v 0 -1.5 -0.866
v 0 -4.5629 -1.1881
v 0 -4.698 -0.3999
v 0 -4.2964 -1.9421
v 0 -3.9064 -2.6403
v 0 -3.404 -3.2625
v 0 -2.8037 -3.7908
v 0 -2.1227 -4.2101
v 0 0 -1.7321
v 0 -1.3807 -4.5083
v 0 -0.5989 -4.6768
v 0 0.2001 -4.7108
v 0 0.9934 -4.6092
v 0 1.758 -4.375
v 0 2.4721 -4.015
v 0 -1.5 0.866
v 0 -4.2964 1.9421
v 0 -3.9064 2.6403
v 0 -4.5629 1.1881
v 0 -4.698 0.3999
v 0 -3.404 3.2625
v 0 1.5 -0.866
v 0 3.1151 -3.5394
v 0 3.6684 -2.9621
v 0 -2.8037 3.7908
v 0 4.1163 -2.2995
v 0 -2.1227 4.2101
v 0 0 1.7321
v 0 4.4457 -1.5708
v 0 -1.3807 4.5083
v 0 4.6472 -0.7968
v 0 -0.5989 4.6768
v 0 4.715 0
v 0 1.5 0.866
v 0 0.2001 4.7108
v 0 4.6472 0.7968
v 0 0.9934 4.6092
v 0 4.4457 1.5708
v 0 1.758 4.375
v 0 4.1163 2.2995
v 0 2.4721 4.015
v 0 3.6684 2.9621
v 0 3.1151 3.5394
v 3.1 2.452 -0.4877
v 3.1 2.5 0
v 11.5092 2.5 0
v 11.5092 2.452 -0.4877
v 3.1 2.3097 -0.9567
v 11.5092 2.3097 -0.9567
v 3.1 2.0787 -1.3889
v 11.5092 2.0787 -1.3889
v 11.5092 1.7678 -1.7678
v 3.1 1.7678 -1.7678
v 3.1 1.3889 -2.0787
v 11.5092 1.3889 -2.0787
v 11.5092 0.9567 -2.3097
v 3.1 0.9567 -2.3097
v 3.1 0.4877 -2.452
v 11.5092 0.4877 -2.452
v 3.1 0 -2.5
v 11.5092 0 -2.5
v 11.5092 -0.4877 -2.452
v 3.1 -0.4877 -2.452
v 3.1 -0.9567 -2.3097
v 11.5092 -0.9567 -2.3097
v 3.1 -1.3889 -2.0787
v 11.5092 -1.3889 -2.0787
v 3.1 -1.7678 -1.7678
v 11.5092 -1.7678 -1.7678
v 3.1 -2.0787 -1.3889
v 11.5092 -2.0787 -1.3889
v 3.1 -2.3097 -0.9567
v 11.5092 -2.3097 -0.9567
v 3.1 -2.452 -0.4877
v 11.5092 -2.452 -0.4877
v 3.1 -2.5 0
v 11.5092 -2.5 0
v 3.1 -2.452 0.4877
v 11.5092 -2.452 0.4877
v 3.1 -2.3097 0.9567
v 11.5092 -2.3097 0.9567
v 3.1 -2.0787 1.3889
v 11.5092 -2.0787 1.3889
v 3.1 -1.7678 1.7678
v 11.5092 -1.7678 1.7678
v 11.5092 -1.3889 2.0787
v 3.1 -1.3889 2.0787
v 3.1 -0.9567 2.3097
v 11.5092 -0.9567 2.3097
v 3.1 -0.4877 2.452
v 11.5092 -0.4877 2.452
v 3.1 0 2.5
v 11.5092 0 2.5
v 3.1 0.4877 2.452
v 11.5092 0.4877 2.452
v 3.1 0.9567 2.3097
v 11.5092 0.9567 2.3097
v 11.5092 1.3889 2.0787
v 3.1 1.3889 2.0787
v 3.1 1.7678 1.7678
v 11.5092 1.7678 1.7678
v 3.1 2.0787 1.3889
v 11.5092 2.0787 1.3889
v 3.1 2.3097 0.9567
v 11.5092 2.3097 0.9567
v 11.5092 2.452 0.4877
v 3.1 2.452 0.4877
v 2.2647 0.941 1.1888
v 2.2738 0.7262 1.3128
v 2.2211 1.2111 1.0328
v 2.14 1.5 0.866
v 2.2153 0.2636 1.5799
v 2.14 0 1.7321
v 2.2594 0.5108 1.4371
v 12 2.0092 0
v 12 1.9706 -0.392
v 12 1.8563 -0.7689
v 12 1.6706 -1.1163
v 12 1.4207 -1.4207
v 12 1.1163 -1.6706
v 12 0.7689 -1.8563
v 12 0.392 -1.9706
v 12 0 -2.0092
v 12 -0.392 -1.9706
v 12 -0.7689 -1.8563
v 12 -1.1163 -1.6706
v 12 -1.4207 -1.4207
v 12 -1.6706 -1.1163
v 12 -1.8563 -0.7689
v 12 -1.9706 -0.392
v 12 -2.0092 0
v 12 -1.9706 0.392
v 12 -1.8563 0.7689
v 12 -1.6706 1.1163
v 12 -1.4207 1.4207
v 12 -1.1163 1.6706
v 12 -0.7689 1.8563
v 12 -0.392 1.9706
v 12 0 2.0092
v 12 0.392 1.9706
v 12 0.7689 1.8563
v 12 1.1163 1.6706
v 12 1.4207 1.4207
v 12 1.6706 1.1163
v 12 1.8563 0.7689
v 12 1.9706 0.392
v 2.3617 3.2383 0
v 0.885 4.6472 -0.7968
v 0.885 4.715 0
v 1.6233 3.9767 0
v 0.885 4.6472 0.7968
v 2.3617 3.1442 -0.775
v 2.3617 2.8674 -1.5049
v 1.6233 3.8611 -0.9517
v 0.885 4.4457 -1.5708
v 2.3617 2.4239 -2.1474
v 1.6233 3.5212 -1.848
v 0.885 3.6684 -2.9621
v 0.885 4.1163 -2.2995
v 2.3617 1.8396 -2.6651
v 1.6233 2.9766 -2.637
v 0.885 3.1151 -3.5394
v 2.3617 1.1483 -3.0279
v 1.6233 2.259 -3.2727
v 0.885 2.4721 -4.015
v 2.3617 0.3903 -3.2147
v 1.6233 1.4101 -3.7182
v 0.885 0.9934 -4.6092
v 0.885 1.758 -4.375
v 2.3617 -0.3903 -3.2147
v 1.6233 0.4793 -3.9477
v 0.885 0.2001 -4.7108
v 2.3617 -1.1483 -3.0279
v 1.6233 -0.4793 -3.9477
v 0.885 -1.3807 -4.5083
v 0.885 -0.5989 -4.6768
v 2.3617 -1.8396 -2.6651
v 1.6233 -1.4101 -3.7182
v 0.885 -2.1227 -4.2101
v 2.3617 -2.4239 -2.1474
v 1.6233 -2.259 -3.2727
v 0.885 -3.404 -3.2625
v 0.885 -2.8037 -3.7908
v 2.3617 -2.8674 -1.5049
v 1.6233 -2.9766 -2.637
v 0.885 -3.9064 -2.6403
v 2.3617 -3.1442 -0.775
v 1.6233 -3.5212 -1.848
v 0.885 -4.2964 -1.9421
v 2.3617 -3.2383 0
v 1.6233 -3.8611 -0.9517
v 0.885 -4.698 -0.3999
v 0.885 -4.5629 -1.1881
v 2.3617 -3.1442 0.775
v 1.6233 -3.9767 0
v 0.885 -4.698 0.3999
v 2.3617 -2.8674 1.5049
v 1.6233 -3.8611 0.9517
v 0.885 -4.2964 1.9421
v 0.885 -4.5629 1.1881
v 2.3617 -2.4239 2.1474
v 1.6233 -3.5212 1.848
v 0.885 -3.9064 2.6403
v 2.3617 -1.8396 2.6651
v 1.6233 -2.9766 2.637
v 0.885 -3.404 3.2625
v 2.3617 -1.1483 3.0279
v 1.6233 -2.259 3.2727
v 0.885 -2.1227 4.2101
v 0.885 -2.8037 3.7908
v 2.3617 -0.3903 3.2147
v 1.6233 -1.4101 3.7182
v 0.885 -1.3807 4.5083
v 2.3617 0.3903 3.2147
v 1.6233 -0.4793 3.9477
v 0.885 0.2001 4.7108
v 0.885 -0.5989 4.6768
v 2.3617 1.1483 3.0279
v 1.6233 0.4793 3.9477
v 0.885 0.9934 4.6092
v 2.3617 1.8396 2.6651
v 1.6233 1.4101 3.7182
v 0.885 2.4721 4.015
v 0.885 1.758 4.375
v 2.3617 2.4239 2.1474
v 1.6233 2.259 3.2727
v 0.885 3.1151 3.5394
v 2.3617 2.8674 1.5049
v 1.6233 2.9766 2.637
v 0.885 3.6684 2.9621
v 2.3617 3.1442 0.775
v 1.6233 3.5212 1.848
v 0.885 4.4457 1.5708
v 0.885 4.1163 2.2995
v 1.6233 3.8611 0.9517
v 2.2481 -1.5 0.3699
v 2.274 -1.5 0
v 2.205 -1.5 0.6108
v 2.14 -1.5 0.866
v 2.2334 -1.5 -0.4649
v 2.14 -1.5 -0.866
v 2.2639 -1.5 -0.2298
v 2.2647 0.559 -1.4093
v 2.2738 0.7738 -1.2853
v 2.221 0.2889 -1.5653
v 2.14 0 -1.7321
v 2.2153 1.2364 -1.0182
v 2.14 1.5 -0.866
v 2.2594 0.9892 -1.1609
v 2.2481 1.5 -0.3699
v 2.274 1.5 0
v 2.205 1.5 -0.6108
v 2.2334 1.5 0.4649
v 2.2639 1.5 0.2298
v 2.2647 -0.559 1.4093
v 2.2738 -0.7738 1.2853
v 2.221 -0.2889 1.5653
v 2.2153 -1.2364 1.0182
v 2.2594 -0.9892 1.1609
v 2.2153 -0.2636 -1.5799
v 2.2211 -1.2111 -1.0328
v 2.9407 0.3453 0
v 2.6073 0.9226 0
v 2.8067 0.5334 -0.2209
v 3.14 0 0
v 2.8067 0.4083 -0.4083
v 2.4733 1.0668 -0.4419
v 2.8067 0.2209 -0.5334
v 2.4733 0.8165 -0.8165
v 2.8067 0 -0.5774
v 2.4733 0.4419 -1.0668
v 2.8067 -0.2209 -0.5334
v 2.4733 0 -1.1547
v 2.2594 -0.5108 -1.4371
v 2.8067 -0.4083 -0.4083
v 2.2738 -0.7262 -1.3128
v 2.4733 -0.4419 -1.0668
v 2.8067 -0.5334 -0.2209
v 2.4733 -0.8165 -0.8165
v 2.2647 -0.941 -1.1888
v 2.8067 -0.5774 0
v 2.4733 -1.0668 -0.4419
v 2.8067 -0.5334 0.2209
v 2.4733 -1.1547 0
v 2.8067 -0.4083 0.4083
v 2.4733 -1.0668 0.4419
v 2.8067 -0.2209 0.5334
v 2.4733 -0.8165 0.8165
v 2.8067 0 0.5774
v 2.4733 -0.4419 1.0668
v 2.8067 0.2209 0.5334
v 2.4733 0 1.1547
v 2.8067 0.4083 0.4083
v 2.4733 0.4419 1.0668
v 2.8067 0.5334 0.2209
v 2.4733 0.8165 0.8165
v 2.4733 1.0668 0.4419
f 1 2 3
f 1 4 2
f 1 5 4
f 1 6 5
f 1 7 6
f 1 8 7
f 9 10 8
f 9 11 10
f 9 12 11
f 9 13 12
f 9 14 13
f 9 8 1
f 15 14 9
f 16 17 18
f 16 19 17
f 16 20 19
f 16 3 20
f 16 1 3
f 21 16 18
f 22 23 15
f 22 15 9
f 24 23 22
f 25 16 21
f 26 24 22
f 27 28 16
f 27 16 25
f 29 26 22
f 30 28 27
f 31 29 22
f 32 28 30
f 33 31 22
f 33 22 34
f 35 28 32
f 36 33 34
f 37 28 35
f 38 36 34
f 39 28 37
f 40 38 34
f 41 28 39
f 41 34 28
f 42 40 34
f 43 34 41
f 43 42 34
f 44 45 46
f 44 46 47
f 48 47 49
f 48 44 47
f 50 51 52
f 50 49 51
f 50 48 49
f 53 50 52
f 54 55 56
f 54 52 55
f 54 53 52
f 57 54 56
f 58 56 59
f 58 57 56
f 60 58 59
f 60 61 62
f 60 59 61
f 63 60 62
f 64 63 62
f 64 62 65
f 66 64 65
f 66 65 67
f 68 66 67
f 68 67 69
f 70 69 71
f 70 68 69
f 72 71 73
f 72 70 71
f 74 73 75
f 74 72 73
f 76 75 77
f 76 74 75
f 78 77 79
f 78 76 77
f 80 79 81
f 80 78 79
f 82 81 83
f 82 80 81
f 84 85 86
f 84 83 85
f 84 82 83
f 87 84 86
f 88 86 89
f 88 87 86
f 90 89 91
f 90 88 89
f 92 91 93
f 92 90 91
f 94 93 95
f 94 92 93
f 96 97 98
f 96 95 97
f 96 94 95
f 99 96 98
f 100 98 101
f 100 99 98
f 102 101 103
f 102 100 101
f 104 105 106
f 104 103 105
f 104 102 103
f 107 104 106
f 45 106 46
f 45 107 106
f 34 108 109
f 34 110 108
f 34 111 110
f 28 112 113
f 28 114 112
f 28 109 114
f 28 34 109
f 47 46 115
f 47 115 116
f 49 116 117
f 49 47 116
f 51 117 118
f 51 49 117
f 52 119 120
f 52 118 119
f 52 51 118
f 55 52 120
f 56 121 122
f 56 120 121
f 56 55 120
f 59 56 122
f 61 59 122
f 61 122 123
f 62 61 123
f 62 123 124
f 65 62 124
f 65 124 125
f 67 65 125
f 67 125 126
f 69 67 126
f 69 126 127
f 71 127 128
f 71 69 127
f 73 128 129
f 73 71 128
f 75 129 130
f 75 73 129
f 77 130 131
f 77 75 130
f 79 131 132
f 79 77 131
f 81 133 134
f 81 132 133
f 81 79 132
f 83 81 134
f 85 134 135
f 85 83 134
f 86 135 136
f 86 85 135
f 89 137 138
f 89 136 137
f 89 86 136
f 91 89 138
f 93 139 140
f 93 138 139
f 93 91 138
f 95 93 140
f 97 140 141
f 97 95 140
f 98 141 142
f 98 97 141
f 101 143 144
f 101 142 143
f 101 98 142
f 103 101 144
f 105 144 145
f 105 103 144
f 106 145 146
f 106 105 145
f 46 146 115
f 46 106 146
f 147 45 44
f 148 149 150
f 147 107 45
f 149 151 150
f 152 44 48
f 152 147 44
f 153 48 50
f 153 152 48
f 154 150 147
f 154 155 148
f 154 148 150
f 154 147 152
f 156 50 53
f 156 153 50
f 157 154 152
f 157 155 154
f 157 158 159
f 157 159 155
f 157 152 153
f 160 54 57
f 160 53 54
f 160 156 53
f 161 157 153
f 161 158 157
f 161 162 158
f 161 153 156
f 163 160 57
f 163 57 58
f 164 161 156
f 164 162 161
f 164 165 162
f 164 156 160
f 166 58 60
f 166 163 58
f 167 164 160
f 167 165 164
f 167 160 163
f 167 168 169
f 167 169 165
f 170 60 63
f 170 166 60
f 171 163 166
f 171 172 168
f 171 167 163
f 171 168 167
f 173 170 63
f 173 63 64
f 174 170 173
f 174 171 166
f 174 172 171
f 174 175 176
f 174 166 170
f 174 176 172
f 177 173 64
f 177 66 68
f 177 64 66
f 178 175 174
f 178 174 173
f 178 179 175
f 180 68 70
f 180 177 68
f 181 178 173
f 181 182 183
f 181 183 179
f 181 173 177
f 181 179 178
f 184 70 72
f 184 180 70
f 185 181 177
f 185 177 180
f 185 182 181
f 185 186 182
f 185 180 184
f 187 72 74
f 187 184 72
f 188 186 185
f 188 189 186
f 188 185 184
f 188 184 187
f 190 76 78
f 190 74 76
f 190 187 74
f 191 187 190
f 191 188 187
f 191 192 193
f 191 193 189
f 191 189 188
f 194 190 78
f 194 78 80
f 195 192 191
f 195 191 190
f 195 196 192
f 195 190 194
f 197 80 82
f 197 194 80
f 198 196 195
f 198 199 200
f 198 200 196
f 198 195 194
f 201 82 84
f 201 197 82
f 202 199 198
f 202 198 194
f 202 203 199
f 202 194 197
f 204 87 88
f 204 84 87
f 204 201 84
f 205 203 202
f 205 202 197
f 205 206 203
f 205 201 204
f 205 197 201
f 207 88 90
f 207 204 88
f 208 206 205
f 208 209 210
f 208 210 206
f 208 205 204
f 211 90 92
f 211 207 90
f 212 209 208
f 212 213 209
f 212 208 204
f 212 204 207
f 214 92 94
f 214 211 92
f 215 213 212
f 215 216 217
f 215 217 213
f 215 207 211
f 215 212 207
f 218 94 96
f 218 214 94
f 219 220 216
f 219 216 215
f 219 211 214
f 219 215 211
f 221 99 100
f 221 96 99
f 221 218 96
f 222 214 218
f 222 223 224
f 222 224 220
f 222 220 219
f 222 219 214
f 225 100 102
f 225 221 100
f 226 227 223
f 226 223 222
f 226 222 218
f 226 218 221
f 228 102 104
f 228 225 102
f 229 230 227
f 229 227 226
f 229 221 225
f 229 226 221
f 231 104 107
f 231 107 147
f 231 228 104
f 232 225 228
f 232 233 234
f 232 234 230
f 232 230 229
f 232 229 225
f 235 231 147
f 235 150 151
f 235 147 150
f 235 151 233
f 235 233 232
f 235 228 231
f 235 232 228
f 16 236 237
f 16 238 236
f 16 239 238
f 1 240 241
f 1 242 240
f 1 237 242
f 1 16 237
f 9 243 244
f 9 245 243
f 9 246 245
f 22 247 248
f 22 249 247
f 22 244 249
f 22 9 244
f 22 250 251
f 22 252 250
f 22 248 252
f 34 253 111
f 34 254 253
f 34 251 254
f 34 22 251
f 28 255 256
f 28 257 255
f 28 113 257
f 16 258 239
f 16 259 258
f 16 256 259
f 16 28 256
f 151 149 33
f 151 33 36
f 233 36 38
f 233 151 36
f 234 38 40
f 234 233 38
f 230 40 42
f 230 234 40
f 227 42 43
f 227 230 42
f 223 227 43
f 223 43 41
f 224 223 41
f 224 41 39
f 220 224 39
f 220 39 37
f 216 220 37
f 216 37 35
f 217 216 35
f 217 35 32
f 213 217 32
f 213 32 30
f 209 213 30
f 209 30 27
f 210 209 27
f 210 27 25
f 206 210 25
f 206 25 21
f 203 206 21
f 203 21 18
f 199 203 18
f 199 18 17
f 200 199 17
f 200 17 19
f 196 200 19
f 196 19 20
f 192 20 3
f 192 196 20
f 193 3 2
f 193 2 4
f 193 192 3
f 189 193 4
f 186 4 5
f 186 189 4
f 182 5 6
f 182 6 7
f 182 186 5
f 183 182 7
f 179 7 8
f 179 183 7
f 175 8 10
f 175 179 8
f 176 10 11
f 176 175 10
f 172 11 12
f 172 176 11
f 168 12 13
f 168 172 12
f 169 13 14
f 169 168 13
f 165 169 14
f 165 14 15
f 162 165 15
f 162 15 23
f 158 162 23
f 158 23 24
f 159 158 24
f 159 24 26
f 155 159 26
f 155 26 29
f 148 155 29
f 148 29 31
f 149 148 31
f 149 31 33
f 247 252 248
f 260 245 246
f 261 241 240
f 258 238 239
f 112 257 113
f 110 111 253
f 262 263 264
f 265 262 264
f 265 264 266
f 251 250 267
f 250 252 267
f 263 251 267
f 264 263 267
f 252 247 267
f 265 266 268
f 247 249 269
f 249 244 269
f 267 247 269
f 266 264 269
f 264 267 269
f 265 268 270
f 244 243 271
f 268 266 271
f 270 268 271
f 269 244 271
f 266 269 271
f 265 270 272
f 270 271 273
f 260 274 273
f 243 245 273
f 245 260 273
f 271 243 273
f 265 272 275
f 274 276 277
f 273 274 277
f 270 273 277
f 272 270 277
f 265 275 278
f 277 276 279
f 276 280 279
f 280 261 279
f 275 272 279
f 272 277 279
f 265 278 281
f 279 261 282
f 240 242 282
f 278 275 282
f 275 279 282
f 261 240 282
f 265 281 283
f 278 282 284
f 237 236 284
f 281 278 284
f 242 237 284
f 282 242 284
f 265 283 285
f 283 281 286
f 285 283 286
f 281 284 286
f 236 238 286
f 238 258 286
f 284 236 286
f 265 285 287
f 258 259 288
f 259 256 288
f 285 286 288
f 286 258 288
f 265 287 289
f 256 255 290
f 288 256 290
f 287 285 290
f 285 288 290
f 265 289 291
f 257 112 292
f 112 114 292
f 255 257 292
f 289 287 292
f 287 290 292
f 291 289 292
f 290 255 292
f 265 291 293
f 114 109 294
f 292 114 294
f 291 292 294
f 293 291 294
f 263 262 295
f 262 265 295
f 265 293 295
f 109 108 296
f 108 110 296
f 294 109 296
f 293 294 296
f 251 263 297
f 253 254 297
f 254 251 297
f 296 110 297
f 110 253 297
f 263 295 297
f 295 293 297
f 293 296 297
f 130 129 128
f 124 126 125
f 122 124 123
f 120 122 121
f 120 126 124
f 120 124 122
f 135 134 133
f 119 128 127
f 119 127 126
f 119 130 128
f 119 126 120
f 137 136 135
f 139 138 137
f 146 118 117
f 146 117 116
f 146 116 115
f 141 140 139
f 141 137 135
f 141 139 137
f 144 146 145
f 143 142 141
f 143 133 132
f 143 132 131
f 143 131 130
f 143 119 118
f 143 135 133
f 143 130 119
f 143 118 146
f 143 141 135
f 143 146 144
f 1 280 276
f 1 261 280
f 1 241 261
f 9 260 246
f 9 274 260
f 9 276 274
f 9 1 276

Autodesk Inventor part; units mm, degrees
ref_plane "YZ Plane" through (0, 0, 0) normal (1, 0, 0) x (0, 1, 0)
ref_plane "XZ Plane" through (0, 0, 0) normal (0, 1, 0) x (-1, 0, 0)
sketch "Esquisse1" plane through (0, 0, 0) normal (0, 0, 1) x (1, 0, 0)
  line L0 (12, 0) -> (12, 2.5)
  line L1 (12, 2.5) -> (5.6, 2.5)
  line L2 (5.6, 2.5) -> (5.1092, 2.5)
  line L3 (0, 4.715) -> (0, 1.7321)
  line L4 (0, 1.7321) -> (2.14, 1.7321)
  line L5 (2.14, 1.7321) -> (3.14, 0)
  line L6 (3.14, 0) -> (12, 0)
  line L7 (0, 4.715) -> (0.885, 4.715)
  line L8 (0.885, 4.715) -> (3.1, 2.5)
  line L9 (5.1092, 2.5) -> (3.1, 2.5)
  line L10 (5.6, 2.5) -> (3.1, 2.5) construction
  line L11 (3.1, 2.5) -> (3.1, 2.5)
  line L12 (-2.4, 0) -> (14.4, 0) projected
  line L13 (0, -0.943) -> (0, 5.658) projected
  dimension "d0" = 12
  dimension "d1" = 6.4
  dimension "d2" = 2.14
  dimension "d3" = 5
  dimension "d6" = 3.1
  dimension "d7" = 45
  dimension "d8" = 3.4641
  dimension "d9" = 60
  dimension "d10" = 9.43
  dimension "d11" = 5
  dimension "d12" = 0.4908
revolve "Corps" add sketch "Esquisse1" angle 360 about axis through (3.14, 0, 0) along (1, 0, 0) contours L6 L5 L4 L3 L7 L8 L9 L2 L1 L0
sketch "Esquisse2" plane through (0, 0, 0) normal (-1, 0, 0) x (0, 0, 1)
  circle A0 centre (0, 0) radius 1.7321 projected
  line L0 (0, -6.601) -> (0, 6.601) projected
  line L1 (-6.601, 0) -> (6.601, 0) projected
  line L2 (1.7321, 0) -> (0.866, -1.5)
  line L3 (0.866, -1.5) -> (-0.866, -1.5)
  line L4 (-0.866, -1.5) -> (-1.7321, 0)
  line L5 (-1.7321, 0) -> (-0.866, 1.5)
  line L6 (-0.866, 1.5) -> (0.866, 1.5)
  line L7 (0.866, 1.5) -> (1.7321, 0)
  point P0 (0, 1.7321)
extrude "Rainure" add sketch "Esquisse2" against normal up to next contours L7 A0 | A0 L2 | L6 L0 A0 | A0 L0 L3 | L0 L6 A0 | A0 L3 L0 | L4 A0 | A0 L5
thread "Filetage" size "M5x0.8" class "6g" standard "ISO Metric profile" length 6.4
chamfer "Chanfrein1" distance 0.4908 distance2 0.4908 1 edges at (12, -2.5, 0) measured on face at (12, -0.6238, 0.9515)
ref_plane "Work Plane1" through (104.775, 0, 0) normal (0, 0, -1) x (1, 0, 0)
equation "\"d15\" = GEL"
equation "\"d17\" = -0.5 * SPD + 0.5 * GD"
equation "\"d18\" = GUL"
equation "\"d0\" = NLG"
equation "\"d1\" = GEL"
equation "\"d2\" = INTI"
equation "\"d3\" = GD"
equation "\"d6\" = KOH"
equation "\"d7\" = 0.5 * SEWI"
equation "\"d8\" = 1.1547 * SW"
equation "\"d10\" = KOD"
equation "\"d11\" = BDM"
equation "\"d12\" = GAL"
equation "\"NLG\" = 12"
equation "\"INTI\" = 2.14"
equation "\"GEL\" = 6.4"
equation "\"GAL\" = 0.61345 * PTC"
equation "\"KOH\" = 3.1"
equation "\"KOD\" = 9.43"
equation "\"GUL\" = 0.61345 * PTC"
equation "\"SPD\" = NND - 1.2269 * PTC"
equation "\"BDM\" = NND"
equation "\"GD\" = NND"
equation "\"SEWI\" = 90deg"
equation "\"SW\" = 3"
equation "\"TOA\" = 30deg"
equation "\"GD1\" = THREADDIA - 1.2269 * PTC"
equation "\"EPV\" = 5.6"
equation "\"THREADDIA\" = 5"
equation "\"PTC\" = 0.8"
equation "\"NND\" = 5"
equation "\"E0\" = 3.47"
equation "\"THREADDESC\" = 1.2345"
properties part number "ISO 10642 - M5 x  12" material "Acier"
